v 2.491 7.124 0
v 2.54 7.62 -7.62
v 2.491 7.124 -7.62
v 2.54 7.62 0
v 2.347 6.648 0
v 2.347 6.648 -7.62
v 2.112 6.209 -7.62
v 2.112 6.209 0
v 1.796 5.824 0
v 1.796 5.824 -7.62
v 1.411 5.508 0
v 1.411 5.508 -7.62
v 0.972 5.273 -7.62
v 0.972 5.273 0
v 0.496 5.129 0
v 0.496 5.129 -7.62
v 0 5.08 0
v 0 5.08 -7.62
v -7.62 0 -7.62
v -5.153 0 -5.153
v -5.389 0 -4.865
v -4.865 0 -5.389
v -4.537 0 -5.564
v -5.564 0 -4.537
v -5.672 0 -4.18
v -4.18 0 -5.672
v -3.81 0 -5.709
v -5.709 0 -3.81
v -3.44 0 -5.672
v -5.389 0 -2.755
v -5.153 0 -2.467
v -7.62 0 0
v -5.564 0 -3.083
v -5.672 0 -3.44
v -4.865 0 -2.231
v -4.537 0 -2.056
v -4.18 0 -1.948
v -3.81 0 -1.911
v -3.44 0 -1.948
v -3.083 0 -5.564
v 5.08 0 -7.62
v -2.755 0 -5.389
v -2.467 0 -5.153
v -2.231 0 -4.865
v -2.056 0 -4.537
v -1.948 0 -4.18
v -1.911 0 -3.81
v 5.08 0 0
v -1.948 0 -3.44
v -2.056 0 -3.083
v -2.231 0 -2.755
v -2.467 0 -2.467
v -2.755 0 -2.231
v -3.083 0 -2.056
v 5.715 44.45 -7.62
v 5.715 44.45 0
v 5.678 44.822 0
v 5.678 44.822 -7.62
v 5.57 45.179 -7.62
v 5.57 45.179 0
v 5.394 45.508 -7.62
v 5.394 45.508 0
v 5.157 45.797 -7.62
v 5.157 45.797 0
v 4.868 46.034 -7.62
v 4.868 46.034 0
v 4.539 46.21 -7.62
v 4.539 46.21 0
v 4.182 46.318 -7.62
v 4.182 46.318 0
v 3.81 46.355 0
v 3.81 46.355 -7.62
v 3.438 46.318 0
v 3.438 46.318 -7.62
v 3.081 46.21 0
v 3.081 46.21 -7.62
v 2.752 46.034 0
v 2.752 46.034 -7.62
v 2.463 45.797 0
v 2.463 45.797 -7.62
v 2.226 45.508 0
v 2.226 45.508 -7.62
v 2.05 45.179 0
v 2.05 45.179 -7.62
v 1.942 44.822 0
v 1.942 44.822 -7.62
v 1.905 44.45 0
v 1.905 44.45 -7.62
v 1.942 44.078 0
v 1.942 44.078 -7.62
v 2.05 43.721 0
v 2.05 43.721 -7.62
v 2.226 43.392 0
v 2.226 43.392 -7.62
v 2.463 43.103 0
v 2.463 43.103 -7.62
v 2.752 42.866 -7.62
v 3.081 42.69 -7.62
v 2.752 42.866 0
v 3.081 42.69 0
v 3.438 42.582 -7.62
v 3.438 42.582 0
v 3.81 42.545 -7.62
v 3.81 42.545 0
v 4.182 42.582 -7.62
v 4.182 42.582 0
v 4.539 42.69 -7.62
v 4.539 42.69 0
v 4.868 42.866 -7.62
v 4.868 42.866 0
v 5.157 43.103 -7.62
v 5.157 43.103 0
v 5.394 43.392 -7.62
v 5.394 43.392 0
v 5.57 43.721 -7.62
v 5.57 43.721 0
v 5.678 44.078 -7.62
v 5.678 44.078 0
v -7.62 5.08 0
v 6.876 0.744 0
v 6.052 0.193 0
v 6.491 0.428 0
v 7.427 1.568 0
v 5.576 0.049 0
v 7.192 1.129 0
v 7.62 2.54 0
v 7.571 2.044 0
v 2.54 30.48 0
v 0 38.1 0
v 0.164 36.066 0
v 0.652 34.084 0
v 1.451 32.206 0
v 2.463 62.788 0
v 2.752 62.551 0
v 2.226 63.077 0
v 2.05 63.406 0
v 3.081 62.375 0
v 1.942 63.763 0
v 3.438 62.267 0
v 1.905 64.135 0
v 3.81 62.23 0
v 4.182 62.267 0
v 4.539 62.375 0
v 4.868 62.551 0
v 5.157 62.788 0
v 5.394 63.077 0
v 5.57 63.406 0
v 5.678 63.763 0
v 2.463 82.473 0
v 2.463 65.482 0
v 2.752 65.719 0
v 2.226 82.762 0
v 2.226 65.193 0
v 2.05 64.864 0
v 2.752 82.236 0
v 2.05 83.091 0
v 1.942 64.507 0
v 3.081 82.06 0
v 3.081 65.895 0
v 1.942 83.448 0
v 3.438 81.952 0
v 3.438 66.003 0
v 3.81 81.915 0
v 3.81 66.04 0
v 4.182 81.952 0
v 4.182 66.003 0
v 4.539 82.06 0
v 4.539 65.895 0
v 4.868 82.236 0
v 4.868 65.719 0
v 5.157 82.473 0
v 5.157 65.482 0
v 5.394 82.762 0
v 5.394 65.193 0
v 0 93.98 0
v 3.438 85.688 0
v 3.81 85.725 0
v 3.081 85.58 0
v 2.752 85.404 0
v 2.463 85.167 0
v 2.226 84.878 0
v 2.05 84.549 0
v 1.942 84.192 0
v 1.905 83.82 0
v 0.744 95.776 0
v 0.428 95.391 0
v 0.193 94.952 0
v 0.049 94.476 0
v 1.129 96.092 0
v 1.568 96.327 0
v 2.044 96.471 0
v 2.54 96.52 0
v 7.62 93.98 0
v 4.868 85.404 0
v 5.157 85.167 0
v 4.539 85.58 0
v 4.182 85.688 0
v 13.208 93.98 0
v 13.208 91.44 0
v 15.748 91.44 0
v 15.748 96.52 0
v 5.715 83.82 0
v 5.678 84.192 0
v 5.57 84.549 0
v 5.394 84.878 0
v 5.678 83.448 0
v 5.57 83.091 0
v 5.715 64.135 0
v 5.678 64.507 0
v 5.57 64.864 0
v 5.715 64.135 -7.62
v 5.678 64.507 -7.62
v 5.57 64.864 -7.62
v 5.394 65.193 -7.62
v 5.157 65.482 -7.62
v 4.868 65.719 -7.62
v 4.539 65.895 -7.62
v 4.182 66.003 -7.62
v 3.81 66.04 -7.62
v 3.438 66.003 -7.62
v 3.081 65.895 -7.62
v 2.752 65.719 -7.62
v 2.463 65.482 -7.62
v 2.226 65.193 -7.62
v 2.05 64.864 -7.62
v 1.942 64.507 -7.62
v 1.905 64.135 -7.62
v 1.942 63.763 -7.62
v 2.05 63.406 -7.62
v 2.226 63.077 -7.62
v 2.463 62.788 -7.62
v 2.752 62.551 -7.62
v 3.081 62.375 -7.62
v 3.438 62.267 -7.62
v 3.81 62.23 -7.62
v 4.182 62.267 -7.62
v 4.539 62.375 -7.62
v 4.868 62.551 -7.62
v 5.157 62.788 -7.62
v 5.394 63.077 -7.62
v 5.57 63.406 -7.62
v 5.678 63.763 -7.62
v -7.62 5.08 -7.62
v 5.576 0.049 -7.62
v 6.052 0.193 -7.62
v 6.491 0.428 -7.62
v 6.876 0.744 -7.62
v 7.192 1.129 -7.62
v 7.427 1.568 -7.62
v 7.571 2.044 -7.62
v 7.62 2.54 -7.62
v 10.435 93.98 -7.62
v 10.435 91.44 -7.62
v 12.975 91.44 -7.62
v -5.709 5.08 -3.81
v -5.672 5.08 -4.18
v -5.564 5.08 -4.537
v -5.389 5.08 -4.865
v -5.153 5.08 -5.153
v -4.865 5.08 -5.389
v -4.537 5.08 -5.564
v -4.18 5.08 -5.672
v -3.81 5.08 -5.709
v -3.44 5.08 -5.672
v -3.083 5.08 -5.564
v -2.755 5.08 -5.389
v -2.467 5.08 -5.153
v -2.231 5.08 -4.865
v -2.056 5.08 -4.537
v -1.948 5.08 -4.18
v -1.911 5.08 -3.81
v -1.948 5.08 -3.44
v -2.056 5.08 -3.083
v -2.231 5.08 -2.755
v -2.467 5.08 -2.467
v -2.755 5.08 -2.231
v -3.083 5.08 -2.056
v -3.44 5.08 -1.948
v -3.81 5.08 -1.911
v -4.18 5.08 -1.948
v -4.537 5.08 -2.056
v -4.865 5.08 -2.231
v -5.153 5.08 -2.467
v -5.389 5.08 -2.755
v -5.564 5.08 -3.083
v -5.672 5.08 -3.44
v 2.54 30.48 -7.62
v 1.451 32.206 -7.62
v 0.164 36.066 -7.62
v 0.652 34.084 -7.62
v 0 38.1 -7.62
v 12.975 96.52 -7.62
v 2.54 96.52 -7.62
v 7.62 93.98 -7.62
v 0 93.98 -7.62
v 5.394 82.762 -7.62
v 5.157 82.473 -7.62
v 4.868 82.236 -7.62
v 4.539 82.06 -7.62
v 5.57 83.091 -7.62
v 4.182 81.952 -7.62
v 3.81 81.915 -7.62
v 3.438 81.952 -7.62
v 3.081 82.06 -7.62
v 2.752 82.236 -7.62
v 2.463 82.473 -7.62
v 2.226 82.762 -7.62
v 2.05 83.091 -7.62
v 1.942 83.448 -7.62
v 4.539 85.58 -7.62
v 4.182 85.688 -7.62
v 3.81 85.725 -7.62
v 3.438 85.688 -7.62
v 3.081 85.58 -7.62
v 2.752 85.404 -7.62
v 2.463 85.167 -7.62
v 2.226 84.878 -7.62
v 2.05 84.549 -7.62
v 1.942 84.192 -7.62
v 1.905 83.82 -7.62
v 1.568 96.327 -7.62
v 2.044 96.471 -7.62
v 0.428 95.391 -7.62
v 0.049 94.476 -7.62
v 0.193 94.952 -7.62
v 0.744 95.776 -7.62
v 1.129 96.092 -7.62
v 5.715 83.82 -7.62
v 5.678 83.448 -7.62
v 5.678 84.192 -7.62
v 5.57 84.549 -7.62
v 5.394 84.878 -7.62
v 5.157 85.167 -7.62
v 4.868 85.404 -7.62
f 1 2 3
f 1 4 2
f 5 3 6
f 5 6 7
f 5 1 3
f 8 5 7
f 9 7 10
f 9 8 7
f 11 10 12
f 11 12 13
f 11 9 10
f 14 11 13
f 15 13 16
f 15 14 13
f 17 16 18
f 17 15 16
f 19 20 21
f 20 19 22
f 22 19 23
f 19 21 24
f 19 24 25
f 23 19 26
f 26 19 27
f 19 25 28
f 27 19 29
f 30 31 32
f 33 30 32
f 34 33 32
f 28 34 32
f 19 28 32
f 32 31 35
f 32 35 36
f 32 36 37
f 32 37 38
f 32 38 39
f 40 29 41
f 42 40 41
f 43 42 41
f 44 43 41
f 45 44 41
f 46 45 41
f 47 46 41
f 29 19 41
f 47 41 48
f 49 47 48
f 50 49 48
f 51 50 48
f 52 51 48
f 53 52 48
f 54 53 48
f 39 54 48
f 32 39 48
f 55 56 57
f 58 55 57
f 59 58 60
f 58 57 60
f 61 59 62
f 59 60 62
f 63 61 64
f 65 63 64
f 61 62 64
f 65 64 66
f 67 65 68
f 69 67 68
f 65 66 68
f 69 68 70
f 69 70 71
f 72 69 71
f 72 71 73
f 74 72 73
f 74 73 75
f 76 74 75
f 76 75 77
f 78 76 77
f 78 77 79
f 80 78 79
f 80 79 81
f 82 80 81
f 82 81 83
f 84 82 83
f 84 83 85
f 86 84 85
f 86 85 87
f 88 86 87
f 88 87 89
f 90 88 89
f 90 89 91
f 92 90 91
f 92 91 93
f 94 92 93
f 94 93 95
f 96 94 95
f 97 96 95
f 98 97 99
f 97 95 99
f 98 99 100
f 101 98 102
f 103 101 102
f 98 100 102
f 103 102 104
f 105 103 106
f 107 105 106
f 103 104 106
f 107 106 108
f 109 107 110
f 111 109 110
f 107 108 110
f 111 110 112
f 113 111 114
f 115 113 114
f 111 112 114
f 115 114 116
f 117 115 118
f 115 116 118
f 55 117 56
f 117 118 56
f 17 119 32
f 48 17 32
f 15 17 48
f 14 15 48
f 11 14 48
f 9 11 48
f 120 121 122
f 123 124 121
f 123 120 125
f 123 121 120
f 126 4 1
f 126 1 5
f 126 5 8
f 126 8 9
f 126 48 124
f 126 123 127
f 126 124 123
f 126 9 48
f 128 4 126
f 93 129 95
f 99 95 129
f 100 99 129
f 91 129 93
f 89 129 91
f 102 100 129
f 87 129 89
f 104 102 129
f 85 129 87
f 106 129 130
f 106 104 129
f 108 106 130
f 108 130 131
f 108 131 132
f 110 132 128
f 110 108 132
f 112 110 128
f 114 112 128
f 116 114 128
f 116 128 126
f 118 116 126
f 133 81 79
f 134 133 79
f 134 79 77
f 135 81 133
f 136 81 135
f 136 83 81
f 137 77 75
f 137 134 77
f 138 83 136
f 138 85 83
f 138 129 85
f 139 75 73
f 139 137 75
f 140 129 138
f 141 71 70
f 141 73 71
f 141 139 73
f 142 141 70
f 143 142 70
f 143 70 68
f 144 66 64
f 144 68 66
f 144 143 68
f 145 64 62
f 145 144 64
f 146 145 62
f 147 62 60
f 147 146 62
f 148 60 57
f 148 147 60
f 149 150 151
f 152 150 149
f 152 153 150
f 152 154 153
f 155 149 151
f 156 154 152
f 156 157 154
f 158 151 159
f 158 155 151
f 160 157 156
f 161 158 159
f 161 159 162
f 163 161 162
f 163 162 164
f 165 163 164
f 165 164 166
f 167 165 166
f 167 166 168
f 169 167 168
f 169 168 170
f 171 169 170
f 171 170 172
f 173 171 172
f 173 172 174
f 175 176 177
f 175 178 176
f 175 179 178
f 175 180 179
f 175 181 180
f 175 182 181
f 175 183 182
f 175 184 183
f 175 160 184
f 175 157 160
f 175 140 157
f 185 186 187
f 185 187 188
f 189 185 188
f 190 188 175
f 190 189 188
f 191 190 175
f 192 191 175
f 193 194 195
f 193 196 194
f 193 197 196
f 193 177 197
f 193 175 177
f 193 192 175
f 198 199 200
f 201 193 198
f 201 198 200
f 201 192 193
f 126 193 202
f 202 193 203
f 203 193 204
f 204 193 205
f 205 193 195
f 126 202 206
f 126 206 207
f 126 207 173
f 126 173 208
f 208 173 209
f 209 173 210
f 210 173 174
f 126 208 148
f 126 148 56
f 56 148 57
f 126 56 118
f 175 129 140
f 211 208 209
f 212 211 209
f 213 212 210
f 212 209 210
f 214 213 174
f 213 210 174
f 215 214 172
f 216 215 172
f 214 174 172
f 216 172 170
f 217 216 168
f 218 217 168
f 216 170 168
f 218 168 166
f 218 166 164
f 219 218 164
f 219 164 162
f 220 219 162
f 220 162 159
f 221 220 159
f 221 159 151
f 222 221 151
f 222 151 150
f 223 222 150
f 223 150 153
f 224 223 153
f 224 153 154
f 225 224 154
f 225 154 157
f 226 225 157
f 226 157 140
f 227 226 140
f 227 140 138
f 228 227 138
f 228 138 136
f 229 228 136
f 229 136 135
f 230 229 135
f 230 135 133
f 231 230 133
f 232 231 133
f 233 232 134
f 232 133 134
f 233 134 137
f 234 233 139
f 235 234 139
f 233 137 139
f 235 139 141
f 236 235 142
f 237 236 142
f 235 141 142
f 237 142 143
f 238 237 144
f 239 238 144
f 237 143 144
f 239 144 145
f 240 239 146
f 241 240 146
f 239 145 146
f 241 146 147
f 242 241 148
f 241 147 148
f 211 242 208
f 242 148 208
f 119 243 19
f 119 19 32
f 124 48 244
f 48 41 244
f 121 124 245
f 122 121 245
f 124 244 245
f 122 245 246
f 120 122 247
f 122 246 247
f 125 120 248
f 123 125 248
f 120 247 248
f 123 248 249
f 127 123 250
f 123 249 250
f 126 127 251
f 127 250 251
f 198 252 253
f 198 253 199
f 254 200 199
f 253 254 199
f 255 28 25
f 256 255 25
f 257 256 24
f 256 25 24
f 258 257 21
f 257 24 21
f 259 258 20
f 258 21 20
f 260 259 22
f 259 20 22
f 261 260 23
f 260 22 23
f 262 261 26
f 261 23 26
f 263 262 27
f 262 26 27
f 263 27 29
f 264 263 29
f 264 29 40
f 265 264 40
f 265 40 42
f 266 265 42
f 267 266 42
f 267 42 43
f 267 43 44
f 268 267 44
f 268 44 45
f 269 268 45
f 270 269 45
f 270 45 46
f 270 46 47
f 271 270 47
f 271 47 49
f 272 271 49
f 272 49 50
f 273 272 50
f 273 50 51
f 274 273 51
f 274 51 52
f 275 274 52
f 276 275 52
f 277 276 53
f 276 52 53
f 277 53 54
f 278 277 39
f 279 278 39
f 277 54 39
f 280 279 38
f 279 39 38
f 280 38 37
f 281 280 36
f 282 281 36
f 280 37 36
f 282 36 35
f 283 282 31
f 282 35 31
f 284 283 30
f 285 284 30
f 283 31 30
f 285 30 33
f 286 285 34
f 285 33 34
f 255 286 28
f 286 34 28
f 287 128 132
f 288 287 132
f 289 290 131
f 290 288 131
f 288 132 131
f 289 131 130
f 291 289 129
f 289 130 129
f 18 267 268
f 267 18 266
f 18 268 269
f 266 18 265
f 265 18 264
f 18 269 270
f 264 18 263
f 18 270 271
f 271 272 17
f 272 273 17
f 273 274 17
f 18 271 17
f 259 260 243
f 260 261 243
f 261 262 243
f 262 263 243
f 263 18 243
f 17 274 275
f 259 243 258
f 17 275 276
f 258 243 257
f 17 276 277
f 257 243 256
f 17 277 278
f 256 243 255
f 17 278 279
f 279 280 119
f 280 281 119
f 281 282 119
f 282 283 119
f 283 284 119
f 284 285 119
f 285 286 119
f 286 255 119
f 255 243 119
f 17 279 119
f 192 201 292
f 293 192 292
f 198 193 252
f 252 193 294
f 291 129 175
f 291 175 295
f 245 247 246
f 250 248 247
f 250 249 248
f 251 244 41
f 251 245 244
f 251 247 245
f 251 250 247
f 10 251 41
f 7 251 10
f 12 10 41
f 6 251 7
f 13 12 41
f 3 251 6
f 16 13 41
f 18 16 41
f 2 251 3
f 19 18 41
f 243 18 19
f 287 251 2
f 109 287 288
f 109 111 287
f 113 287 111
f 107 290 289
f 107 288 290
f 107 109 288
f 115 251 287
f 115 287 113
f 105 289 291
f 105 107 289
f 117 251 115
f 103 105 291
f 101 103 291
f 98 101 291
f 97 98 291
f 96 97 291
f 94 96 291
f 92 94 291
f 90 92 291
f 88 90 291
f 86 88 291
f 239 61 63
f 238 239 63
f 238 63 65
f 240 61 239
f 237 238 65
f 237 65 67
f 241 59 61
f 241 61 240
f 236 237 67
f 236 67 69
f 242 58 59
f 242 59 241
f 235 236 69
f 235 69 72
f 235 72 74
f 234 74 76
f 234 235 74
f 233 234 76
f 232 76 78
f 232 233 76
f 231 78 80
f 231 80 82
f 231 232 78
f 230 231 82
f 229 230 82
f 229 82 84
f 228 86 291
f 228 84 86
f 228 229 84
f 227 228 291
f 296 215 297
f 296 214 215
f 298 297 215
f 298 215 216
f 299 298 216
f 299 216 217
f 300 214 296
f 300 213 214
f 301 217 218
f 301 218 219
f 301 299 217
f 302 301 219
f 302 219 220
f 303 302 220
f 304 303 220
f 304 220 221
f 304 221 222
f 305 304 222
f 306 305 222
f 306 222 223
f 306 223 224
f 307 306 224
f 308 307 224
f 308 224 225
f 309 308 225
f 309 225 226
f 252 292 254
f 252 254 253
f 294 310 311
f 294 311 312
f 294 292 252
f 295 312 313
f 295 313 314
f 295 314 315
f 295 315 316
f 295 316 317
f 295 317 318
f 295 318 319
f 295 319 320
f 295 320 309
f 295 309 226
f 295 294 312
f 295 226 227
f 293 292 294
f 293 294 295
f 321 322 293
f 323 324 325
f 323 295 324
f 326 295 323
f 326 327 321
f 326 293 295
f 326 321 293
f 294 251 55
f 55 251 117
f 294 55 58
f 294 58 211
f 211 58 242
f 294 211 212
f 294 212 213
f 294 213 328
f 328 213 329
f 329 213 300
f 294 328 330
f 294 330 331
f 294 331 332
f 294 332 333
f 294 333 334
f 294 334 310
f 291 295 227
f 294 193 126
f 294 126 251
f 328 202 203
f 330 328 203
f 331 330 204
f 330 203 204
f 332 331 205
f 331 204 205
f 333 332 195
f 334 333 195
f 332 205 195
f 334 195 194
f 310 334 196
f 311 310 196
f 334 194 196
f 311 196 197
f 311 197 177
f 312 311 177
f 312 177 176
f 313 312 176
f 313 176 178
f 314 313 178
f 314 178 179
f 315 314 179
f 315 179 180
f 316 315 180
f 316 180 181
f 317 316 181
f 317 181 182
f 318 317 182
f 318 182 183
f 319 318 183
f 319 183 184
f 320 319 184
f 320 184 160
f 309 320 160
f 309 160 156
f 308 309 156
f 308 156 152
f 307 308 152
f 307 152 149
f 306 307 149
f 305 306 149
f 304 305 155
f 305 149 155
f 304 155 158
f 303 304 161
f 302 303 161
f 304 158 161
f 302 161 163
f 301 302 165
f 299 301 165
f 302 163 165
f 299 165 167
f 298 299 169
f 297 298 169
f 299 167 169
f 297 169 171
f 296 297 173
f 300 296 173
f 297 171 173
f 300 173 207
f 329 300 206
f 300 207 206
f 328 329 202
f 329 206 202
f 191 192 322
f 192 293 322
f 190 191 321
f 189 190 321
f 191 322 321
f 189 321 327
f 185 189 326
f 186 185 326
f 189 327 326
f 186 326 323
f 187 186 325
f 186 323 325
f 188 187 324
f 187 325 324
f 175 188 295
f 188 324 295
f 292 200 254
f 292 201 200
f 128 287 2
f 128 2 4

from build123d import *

# Parameters (mm, degrees)
SKETCH1_W             = 7.62
SKETCH1_H             = 96.52
BOSS_EXTRUDE1_DEPTH   = 7.62
SKETCH2_W             = 7.62
SKETCH2_H             = 5.08
BOSS_EXTRUDE2_DEPTH   = 7.62
SKETCH4_W             = 7.62
SKETCH4_H             = 2.54
BOSS_EXTRUDE3_DEPTH   = 8.128
BOSS_EXTRUDE4_DEPTH   = 2.54
F_6_CLEARANCE_HOLE1_D = 3.7973
CUT_EXTRUDE1_DEPTH    = 2.54
SKETCH12_W            = 7.62
SKETCH12_H            = 25.4
CUT_EXTRUDE2_DEPTH    = 2.54
FILLET2_R             = 12.7
FILLET3_R             = 2.54
SKETCH14_R            = 1.905
CUT_EXTRUDE4_DEPTH    = 99.092682214


with BuildPart() as part:
    # Sketch1 → Boss-Extrude1 (new body)
    with BuildSketch(Plane(origin=(0, 0, 0), x_dir=(0, 0, -1), z_dir=(1, 0, 0))):
        with Locations((3.81, 48.26)):
            Rectangle(SKETCH1_W, SKETCH1_H)
    extrude(amount=BOSS_EXTRUDE1_DEPTH)

    # Sketch2 → Boss-Extrude2 (add)
    with BuildSketch(Plane.ZY):
        with Locations((-3.81, 2.54)):
            Rectangle(SKETCH2_W, SKETCH2_H)
    extrude(amount=BOSS_EXTRUDE2_DEPTH)

    # Sketch4 → Boss-Extrude3 (add)
    with BuildSketch(Plane(origin=(7.62, 0, 0), x_dir=(0, 0, -1), z_dir=(1, 0, 0))):
        with Locations((3.81, 95.25)):
            Rectangle(SKETCH4_W, SKETCH4_H)
    extrude(amount=BOSS_EXTRUDE3_DEPTH)

    # Sketch5 → Boss-Extrude4 (add)
    with BuildSketch(Plane.XZ.offset(-93.98)):
        Polygon((15.748, 0), (12.974546815, -7.62), (10.434546815, -7.62), (13.208, 0), align=None)
    extrude(amount=BOSS_EXTRUDE4_DEPTH)

    # #6 Clearance Hole1 (through all)
    with Locations(Plane(origin=(0, 5.08, 0), x_dir=(1, 0, 0), z_dir=(0, 1, 0))):
        with Locations((-3.81, 3.81)):
            Hole(F_6_CLEARANCE_HOLE1_D / 2)

    # Sketch8 → Cut-Extrude1 (cut)
    with BuildSketch(Plane.XZ.offset(-93.98)):
        Polygon((15.748, -7.62), (12.974546815, -7.62), (15.748, 0), align=None)
    extrude(amount=-CUT_EXTRUDE1_DEPTH, mode=Mode.SUBTRACT)

    # Sketch12 → Cut-Extrude2 (cut)
    with BuildSketch(Plane.ZY):
        with Locations((-3.81, 17.78)):
            Rectangle(SKETCH12_W, SKETCH12_H)
    extrude(amount=-CUT_EXTRUDE2_DEPTH, mode=Mode.SUBTRACT)

    # Fillet2
    # the kernel refuses this fillet: 12.7 mm, written as the material it takes off along each edge
    with BuildSketch(Plane(origin=(0, 30.48, 19.05), x_dir=(1, 0, 0), z_dir=(0, 0, -1))) as fillet2_piece_1:
        with BuildLine():
            CenterArc((12.7, -7.62), FILLET2_R, 143.130102354, 36.869897646)
            Line((0, -7.62), (-0.254, -7.62))
            Line((-0.254, -7.62), (-0.254, 0))
            Line((-0.254, 0), (0, 0.254))
            ThreePointArc((0, 0.254), (1.27, 0.254), (2.3368, 0.1524))
            Line((2.3368, 0.1524), (2.54, 0))
        make_face()
    extrude(amount=45.72, mode=Mode.SUBTRACT)

    # Fillet3
    fillet3_edges = [part.edges().sort_by_distance(p)[0] for p in [
        (2.54, 5.08, -3.81),
        (7.62, 0, -3.81),
        (0, 96.52, -3.81),
    ]]
    fillet(fillet3_edges, radius=FILLET3_R)

    # Sketch14 → Cut-Extrude4 (cut, through all)
    with BuildSketch(Plane.XY):
        with Locations((3.81, 83.82)):
            Circle(SKETCH14_R)
        with Locations((3.81, 44.45)):
            Circle(SKETCH14_R)
        with Locations((3.81, 64.135)):
            Circle(SKETCH14_R)
    extrude(amount=-CUT_EXTRUDE4_DEPTH, mode=Mode.SUBTRACT)


solid = part.part
